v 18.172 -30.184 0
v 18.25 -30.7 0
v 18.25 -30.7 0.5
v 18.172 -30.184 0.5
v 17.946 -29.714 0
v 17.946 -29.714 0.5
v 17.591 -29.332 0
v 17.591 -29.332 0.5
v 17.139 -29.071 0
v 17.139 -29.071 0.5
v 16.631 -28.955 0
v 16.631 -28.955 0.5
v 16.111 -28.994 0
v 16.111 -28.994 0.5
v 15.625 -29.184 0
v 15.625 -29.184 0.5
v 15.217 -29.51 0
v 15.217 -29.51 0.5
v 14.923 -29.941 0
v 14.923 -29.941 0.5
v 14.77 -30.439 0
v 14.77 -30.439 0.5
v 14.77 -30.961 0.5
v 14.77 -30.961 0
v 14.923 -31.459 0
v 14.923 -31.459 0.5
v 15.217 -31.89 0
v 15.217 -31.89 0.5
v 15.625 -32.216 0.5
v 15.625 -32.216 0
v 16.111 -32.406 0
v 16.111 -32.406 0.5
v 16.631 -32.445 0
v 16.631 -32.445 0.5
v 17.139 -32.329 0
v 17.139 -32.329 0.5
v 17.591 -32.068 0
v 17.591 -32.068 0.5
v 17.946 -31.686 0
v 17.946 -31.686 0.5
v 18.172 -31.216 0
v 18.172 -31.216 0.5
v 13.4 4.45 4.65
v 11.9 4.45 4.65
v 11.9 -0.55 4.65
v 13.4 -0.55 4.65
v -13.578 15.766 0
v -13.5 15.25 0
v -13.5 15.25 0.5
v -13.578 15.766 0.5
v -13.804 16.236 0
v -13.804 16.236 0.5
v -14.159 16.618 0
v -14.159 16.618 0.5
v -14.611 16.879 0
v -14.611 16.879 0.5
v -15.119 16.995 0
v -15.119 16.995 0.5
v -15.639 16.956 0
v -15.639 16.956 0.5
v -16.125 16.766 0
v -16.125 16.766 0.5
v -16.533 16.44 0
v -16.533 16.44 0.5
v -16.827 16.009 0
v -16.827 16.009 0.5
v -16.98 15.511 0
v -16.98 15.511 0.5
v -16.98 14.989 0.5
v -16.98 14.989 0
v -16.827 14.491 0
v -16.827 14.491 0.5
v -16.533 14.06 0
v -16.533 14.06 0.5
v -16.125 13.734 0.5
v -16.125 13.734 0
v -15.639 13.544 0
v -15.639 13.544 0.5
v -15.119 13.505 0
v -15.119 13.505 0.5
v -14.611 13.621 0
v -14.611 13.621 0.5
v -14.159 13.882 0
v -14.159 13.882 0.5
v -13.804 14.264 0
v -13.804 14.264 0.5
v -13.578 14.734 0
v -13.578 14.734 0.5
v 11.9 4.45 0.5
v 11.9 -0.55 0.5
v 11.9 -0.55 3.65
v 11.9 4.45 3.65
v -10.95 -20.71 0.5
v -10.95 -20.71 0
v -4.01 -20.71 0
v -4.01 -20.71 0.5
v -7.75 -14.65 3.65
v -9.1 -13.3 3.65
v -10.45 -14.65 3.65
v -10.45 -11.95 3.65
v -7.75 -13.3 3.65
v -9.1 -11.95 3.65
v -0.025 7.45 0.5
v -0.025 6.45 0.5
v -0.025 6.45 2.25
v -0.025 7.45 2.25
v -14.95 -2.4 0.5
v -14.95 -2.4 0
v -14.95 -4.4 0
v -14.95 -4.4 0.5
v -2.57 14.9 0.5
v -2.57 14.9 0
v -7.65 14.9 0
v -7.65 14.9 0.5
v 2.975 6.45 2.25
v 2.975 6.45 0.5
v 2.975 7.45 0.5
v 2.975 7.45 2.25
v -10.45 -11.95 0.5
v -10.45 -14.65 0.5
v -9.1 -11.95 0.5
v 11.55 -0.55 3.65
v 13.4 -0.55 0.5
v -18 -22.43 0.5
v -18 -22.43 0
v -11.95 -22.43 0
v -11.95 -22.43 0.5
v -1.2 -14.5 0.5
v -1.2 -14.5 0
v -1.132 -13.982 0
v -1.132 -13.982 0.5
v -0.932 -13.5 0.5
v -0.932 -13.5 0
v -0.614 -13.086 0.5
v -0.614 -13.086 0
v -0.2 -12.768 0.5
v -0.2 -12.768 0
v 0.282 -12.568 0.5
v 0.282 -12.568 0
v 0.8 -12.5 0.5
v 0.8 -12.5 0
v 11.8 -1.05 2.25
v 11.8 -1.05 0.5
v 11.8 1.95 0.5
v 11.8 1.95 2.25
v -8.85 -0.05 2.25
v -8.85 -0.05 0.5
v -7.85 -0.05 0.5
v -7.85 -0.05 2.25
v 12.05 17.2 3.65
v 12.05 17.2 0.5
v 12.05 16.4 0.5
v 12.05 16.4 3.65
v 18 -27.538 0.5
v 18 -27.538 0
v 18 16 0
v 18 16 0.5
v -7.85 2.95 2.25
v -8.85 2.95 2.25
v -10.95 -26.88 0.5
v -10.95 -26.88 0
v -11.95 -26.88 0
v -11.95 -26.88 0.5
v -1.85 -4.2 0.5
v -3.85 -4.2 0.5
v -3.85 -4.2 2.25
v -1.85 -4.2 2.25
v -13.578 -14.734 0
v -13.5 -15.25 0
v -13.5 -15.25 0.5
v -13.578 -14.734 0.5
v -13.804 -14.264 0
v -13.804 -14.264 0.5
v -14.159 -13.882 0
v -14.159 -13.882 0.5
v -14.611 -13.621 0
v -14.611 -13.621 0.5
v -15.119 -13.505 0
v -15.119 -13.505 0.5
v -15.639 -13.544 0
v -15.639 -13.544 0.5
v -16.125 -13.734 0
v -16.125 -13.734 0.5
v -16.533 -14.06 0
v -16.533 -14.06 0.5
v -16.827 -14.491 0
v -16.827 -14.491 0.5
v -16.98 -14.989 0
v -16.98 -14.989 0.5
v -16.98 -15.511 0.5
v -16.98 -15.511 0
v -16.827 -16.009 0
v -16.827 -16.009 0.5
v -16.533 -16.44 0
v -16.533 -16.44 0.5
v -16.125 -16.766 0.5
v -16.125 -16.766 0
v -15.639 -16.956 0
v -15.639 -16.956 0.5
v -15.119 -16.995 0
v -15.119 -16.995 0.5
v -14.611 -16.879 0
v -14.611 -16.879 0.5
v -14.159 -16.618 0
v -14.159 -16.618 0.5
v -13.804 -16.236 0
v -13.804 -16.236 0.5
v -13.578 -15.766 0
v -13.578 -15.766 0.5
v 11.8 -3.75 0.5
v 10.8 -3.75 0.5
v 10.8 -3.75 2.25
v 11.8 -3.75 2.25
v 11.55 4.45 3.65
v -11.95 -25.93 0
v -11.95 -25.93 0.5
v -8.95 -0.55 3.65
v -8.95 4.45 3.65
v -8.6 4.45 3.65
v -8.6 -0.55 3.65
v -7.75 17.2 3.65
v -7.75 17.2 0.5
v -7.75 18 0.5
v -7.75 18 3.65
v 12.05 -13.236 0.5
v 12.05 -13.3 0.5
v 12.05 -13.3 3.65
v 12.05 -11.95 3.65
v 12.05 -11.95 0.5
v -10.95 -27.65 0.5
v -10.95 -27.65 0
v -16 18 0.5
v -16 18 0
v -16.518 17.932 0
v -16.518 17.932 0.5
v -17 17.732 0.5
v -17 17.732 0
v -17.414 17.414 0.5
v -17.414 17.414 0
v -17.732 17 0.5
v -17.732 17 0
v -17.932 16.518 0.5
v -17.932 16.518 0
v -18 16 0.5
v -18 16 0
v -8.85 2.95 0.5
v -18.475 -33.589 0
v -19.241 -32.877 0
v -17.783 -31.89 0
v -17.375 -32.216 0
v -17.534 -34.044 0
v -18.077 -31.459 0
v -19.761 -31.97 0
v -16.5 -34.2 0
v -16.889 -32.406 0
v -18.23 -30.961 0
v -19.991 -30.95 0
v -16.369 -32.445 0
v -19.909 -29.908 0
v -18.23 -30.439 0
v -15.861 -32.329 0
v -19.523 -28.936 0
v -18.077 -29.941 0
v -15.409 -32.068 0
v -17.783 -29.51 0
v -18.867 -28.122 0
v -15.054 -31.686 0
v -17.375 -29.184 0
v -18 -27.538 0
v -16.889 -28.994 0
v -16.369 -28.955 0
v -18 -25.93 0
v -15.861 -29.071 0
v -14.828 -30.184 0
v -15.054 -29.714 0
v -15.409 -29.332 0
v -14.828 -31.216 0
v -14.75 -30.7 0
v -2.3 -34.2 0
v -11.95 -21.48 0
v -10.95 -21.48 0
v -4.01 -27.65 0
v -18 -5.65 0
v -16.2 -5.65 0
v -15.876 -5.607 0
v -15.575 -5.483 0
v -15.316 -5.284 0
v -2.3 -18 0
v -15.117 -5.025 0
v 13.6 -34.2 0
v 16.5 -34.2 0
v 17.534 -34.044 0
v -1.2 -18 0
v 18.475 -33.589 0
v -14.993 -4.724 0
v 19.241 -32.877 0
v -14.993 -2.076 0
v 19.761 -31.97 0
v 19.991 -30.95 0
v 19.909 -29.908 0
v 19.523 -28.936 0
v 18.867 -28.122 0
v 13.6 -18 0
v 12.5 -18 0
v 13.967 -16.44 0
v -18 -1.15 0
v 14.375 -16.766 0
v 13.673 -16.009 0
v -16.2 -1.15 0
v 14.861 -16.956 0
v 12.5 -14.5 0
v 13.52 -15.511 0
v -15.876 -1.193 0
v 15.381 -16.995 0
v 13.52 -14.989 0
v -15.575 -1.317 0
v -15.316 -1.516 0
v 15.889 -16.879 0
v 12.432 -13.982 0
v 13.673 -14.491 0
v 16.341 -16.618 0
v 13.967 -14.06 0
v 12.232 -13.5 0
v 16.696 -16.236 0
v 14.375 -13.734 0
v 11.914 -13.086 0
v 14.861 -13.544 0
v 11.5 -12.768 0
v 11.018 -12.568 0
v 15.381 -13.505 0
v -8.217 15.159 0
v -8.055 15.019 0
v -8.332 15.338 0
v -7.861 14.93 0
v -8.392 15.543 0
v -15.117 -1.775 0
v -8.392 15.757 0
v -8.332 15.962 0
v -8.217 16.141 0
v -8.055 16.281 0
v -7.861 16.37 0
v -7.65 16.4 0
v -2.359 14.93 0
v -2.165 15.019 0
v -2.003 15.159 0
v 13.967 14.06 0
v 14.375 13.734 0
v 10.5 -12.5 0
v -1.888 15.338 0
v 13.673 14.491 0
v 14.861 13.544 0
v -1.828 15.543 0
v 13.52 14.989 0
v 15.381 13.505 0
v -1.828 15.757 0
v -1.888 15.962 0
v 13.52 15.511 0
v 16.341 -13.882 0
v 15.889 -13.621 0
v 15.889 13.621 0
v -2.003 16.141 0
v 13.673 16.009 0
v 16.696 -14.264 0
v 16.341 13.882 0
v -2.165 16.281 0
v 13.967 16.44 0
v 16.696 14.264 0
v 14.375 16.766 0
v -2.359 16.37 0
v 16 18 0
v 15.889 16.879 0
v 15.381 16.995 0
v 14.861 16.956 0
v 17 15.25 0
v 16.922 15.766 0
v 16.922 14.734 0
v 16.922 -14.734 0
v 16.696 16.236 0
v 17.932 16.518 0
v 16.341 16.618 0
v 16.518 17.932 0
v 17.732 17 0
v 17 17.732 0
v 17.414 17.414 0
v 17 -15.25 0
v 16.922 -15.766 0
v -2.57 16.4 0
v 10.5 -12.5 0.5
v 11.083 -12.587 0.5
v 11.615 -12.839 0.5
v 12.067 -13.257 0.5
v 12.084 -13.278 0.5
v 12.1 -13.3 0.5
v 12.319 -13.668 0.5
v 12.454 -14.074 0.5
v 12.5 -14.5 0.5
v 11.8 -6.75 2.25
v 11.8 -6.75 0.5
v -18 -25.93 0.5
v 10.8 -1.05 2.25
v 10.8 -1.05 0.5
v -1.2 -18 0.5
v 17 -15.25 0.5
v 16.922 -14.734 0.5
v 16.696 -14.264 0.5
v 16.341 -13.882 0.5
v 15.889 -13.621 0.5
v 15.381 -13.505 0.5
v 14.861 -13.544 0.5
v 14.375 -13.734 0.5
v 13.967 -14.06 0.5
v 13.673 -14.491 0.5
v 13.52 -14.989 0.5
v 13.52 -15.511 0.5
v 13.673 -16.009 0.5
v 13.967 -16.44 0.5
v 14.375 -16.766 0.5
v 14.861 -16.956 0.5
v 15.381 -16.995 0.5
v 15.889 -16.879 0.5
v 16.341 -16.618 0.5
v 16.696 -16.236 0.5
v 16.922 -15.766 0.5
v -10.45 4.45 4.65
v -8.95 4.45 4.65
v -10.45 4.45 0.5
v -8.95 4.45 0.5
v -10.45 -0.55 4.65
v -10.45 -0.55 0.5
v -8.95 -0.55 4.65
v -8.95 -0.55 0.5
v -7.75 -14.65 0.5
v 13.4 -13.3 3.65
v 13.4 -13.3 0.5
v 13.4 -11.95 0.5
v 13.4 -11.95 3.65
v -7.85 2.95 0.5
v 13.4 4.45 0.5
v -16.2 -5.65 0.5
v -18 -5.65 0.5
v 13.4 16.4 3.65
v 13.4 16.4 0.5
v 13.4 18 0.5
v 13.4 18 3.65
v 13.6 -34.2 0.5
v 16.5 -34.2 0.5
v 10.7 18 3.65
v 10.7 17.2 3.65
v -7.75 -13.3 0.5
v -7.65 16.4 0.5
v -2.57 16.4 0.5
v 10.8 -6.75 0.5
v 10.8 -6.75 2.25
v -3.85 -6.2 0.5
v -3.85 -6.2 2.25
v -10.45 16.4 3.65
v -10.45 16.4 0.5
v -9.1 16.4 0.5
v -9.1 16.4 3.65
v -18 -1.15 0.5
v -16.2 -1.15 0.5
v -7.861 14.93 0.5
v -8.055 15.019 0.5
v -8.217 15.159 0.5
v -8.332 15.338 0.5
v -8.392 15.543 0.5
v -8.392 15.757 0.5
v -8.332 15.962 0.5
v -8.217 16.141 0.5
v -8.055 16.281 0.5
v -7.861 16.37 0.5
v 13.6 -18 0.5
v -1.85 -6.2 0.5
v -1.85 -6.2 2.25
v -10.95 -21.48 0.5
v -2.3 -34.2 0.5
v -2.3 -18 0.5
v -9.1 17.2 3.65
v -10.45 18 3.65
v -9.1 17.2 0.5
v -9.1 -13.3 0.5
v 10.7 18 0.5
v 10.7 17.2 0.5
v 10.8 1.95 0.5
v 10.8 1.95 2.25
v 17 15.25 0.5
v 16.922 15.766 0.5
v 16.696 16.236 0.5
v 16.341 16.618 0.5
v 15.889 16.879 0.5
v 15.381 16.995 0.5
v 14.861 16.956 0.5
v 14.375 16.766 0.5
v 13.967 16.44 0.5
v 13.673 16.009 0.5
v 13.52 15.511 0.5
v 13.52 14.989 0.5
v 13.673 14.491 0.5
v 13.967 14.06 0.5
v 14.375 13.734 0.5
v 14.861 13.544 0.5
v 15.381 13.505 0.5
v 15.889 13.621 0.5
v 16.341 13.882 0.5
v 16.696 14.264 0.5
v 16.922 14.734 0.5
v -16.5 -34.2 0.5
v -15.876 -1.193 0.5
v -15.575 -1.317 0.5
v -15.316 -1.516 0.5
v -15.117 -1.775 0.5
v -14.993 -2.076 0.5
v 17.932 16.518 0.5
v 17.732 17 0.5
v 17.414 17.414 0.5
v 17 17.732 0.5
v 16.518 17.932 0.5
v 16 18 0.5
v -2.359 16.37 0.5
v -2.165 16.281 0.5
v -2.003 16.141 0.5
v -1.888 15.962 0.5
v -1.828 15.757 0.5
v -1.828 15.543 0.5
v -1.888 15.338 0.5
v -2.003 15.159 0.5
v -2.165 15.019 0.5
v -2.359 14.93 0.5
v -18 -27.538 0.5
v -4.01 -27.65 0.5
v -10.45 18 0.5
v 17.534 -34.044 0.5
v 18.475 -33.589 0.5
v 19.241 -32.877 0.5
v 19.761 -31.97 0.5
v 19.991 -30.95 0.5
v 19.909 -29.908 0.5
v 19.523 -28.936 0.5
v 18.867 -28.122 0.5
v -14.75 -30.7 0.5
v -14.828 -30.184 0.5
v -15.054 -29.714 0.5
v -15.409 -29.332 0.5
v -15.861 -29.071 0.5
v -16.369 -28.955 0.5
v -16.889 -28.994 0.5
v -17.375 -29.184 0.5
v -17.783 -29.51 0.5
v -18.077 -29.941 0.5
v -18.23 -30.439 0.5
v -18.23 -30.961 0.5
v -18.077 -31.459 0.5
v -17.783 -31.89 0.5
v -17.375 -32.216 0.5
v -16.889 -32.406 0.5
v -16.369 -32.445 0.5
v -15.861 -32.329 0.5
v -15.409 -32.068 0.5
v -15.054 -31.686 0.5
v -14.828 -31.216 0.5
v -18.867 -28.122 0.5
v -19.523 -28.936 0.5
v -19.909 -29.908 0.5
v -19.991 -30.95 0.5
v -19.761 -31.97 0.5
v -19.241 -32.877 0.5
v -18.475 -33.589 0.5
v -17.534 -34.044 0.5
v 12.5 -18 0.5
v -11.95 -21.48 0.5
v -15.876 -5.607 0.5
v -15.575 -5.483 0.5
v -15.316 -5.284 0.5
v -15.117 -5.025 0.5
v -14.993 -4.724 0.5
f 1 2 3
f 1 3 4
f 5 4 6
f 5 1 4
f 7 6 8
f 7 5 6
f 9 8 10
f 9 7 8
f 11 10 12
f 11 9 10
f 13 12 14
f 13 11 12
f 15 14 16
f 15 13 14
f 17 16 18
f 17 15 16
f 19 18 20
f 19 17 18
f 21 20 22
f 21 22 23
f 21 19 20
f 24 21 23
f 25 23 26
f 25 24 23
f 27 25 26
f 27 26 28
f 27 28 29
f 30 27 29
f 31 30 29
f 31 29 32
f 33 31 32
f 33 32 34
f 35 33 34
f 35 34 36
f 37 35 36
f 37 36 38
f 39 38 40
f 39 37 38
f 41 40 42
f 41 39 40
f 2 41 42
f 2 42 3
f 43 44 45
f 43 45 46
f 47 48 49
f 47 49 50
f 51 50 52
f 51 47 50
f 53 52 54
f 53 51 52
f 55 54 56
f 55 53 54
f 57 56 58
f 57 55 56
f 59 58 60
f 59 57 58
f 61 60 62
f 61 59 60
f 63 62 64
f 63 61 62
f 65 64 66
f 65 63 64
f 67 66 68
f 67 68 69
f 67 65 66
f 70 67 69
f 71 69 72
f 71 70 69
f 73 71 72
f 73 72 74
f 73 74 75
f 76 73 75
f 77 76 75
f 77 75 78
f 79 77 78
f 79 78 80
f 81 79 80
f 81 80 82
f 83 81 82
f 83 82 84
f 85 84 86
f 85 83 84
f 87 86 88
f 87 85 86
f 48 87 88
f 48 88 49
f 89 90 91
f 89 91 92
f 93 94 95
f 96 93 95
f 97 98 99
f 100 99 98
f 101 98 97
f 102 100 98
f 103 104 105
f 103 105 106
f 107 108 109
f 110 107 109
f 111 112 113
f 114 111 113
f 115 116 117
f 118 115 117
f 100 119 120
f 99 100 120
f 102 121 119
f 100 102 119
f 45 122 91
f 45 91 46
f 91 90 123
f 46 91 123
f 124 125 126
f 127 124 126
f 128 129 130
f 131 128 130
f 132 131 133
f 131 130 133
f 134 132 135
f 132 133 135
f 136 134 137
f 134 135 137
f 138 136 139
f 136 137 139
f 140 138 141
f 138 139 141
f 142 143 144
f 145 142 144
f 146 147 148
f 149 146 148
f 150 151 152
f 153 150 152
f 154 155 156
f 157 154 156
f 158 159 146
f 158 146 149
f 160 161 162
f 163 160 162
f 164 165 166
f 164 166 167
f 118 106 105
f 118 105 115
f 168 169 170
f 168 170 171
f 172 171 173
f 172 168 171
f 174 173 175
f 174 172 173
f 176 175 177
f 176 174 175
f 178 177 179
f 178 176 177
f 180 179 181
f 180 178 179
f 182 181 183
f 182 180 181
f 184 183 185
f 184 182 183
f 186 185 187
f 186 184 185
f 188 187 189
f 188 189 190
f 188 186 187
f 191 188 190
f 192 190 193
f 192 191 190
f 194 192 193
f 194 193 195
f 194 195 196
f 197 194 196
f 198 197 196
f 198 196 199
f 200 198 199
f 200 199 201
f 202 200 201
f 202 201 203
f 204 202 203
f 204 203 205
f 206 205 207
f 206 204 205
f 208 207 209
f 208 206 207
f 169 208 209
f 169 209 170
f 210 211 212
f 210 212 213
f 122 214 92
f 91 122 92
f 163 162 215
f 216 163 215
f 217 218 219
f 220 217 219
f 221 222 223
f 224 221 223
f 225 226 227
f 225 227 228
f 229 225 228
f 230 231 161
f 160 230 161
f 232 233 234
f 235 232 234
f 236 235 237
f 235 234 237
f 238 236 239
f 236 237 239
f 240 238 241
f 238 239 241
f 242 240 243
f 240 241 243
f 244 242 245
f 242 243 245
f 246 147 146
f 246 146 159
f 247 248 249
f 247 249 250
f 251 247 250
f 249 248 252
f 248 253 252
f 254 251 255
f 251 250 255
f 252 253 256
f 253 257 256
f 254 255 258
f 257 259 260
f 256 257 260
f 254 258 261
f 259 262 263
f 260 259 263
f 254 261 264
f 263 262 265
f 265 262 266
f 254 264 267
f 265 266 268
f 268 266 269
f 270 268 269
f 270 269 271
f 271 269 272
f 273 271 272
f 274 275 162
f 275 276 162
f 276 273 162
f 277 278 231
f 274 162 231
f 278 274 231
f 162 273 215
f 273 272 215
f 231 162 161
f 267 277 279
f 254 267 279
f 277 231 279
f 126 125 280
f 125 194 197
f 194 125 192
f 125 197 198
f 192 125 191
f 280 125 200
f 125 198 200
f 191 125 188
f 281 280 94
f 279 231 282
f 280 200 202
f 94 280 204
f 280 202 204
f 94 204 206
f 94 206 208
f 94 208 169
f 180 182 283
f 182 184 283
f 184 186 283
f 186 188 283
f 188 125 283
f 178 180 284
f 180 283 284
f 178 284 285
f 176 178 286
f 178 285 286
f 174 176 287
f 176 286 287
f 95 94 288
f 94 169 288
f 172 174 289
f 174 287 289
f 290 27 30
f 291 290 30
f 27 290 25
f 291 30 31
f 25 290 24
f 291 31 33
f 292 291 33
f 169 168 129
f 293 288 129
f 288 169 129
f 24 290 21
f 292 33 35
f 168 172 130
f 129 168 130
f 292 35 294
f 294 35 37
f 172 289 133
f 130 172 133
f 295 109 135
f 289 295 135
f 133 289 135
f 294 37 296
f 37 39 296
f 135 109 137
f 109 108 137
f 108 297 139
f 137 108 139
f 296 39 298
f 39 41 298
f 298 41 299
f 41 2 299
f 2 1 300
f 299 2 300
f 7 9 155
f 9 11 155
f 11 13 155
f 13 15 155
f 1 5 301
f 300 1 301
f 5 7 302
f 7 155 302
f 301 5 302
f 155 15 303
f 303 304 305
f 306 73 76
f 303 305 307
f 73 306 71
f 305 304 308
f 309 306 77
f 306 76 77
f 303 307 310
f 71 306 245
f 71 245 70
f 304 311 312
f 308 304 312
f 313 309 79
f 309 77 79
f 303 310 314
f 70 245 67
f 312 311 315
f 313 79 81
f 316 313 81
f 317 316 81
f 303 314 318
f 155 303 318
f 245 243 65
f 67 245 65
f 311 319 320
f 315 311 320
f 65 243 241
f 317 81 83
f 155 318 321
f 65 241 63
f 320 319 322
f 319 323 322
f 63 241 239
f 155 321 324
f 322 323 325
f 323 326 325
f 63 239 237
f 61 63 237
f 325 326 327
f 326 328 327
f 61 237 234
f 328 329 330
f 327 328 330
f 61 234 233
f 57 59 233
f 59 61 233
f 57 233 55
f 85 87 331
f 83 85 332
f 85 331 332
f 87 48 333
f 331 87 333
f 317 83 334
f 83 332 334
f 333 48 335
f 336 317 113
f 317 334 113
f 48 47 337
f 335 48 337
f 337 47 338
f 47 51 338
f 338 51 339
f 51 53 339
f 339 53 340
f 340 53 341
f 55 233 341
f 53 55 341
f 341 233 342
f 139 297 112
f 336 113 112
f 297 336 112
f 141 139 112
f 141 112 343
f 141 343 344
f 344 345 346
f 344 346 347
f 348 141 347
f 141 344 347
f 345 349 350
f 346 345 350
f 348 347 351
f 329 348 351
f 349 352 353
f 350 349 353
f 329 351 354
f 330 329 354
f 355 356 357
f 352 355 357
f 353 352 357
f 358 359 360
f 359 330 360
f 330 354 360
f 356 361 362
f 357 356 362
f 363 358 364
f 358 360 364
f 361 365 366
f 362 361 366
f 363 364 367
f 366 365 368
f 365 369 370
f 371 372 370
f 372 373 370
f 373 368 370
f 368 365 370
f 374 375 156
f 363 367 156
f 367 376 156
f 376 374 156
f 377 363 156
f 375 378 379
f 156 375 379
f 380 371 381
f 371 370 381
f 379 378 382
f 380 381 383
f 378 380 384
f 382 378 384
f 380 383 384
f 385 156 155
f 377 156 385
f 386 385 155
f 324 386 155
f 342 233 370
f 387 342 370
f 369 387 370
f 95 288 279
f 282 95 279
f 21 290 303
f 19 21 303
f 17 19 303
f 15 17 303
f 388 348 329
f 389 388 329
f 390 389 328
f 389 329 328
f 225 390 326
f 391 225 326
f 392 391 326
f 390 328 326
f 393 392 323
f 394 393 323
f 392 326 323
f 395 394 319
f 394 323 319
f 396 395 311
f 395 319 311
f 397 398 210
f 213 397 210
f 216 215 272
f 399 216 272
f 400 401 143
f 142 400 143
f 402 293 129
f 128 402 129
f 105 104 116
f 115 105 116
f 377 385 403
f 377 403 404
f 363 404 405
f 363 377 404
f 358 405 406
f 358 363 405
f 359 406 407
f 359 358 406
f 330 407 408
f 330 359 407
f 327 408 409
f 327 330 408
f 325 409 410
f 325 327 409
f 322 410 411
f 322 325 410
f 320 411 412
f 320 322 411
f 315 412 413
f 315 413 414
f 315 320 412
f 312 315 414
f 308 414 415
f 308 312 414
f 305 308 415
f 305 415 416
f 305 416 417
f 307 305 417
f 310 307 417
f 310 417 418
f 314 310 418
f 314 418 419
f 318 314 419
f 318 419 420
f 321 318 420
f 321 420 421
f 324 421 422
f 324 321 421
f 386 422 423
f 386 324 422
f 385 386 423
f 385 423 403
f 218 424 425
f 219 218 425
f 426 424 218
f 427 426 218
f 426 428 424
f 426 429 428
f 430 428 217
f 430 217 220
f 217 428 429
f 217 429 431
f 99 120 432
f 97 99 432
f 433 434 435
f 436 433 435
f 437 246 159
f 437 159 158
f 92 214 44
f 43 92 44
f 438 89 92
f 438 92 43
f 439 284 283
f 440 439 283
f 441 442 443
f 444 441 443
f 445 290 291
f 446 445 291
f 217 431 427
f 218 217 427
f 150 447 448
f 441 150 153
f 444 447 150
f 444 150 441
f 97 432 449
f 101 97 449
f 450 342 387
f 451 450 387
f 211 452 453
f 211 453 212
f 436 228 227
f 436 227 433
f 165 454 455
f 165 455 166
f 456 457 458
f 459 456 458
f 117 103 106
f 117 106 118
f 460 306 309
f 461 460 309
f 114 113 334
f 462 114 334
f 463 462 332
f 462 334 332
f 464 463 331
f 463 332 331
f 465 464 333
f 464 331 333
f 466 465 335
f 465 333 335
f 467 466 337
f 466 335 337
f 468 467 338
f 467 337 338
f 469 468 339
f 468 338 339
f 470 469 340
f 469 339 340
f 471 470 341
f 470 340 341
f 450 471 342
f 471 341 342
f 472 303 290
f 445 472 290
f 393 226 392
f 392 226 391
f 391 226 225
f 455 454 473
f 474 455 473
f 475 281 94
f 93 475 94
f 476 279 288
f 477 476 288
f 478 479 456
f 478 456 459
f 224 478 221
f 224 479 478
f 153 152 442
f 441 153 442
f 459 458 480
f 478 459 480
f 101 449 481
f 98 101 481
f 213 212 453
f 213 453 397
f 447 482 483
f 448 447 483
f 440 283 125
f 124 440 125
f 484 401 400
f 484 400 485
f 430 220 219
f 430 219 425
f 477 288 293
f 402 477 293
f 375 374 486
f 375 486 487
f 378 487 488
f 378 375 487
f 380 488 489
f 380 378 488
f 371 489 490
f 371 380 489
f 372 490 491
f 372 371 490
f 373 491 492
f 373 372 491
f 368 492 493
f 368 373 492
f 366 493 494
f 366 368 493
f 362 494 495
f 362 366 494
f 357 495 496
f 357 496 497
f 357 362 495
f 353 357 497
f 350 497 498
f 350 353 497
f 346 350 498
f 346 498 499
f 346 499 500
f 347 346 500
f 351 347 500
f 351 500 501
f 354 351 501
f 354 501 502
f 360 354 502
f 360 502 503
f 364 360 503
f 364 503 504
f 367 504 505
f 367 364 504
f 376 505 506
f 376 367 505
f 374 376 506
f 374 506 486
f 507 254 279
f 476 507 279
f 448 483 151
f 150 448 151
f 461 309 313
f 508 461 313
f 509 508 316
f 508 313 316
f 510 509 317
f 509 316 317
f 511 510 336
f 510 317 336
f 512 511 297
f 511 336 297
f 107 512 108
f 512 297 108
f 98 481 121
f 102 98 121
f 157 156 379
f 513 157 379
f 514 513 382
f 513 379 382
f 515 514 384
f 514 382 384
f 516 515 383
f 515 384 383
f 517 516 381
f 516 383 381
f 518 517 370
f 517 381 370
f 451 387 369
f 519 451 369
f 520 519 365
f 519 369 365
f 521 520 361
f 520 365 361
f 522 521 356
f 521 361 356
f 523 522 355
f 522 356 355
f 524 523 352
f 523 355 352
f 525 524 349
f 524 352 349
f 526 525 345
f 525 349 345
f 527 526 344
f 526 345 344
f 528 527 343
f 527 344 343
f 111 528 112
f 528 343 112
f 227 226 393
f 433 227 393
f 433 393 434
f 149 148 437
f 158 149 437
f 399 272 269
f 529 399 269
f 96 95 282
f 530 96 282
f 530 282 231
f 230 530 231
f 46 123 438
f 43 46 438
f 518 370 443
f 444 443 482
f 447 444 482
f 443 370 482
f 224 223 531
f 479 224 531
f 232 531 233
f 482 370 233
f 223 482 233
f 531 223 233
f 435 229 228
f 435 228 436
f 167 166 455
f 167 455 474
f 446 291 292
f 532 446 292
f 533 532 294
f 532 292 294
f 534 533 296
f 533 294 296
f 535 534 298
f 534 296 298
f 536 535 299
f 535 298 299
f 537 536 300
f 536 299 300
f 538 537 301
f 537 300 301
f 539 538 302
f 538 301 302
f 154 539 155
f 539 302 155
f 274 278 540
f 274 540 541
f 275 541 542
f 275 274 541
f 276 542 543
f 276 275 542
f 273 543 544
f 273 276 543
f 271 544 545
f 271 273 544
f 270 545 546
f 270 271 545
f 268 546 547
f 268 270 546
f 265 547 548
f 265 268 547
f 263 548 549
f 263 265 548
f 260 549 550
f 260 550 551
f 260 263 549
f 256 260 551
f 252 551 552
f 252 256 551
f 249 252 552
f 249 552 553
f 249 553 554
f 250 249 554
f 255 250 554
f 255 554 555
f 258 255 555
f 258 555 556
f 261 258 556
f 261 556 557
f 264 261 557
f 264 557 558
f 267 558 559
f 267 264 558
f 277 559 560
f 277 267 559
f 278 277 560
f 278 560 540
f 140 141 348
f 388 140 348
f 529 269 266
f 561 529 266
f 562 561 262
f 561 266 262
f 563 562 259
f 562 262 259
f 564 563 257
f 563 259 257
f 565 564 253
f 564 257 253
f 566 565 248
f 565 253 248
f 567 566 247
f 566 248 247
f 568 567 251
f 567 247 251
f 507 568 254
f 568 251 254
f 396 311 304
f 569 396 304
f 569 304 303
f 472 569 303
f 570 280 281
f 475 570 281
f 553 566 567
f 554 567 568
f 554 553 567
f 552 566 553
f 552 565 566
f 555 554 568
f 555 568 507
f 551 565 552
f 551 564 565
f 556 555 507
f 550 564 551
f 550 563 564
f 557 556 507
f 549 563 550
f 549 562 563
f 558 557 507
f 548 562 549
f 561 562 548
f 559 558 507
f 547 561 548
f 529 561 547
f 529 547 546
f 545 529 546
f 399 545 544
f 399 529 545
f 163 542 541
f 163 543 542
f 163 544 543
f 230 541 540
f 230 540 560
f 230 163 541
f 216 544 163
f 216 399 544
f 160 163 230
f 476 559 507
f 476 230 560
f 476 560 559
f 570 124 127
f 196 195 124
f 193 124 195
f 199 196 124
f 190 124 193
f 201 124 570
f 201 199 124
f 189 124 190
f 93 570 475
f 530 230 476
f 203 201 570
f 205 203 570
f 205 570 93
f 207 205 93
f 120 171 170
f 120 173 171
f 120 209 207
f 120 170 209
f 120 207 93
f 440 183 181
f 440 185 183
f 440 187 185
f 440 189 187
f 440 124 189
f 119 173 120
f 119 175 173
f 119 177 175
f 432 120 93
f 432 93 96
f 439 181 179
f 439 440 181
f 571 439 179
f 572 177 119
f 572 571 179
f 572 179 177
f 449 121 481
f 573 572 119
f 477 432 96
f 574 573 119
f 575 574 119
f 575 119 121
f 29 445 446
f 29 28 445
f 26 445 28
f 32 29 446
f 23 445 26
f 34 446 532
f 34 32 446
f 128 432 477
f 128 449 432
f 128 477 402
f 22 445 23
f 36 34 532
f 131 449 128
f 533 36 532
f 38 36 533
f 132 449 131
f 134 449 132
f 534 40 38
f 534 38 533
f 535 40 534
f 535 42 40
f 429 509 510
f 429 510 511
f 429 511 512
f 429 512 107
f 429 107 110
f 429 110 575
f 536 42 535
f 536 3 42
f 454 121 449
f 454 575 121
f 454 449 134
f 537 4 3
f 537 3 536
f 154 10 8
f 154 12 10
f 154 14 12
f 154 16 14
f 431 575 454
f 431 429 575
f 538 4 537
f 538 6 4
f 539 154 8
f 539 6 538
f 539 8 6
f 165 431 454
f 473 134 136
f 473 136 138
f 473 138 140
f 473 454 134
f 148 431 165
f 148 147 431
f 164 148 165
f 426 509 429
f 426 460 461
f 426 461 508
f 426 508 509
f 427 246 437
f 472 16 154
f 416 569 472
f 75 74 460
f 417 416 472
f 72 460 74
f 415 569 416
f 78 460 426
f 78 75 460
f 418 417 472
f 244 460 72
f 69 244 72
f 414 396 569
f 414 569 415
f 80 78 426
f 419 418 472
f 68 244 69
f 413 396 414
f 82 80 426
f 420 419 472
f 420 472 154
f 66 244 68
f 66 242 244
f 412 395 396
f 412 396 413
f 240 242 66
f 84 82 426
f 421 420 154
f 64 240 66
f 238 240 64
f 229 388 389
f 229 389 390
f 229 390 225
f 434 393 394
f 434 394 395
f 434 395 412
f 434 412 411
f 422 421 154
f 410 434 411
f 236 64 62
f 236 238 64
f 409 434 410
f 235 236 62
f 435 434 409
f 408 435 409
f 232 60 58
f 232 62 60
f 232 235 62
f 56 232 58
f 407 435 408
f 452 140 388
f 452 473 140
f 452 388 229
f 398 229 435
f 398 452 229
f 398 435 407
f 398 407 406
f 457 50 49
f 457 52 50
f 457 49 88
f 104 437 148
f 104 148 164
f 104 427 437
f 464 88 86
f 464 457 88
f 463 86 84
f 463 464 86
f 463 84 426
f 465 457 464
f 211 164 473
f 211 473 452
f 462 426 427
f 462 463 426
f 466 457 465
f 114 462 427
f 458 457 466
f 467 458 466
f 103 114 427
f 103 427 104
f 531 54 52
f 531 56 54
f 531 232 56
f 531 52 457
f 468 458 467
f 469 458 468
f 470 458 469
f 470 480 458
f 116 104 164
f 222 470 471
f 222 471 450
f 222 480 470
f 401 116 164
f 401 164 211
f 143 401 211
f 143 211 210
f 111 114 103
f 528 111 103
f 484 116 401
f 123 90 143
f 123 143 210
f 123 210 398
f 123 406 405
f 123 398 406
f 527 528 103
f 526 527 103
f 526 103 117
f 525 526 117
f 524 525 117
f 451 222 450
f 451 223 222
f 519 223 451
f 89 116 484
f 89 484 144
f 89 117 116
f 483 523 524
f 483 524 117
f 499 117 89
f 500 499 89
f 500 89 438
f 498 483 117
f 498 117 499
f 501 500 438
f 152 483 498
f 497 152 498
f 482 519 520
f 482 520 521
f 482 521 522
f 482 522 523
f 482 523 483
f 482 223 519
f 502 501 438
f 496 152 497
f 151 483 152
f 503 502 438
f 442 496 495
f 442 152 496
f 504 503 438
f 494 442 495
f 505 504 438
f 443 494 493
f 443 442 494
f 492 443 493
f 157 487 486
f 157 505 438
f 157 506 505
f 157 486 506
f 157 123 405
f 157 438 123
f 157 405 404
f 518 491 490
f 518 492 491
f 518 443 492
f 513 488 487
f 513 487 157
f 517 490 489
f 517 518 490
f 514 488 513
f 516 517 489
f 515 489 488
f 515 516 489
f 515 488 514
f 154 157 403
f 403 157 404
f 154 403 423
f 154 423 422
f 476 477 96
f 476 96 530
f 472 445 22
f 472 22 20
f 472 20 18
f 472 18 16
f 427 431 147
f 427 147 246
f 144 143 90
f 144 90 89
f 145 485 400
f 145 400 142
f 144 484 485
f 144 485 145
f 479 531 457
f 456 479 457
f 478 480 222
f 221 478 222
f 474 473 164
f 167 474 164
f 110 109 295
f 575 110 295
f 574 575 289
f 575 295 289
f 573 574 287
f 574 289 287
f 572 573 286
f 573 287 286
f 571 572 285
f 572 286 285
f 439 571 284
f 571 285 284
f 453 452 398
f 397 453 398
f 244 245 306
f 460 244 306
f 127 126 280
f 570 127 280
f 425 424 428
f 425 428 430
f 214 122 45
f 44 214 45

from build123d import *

# Parameters (mm, degrees)
SKETCH1_R           = 1.75
BASE_SHAPE_DEPTH    = 0.5
SKETCH2_W           = 3
SKETCH2_H           = 1
SKETCH2_W_2         = 1
SKETCH2_H_2         = 3
SKETCH2_W_3         = 2
SKETCH2_H_3         = 2
RX_SUPPORTS_DEPTH   = 1.75
SKETCH3_W           = 1.5
SKETCH3_H           = 5
CLIP_BASE_DEPTH     = 3.15
SKETCH4_W           = 1.85
SKETCH4_H           = 5
CLIP_TOP_DEPTH      = 1
CLIP_CHAMFER_REACH  = 41.42
SKETCH6_W           = 1.35
SKETCH6_H           = 1.35
BOSS_EXTRUDE1_DEPTH = 3.15


with BuildPart() as part:
    # Sketch1 → Base shape (new body)
    with BuildSketch(Plane.XY):
        with BuildLine():
            Line((18, -27.53772234), (18, 16))
            ThreePointArc((18, 16), (17.414213562, 17.414213562), (16, 18))
            Line((16, 18), (-16, 18))
            ThreePointArc((-16, 18), (-17.414213562, 17.414213562), (-18, 16))
            Line((-18, 16), (-18, -1.15))
            Line((-18, -1.15), (-16.2, -1.15))
            ThreePointArc((-16.2, -1.15), (-15.316116524, -1.516116524), (-14.95, -2.4))
            Line((-14.95, -2.4), (-14.95, -4.4))
            ThreePointArc((-14.95, -4.4), (-15.316116524, -5.283883476), (-16.2, -5.65))
            Line((-16.2, -5.65), (-18, -5.65))
            Line((-18, -5.65), (-18, -22.43))
            Line((-18, -22.43), (-11.95, -22.43))
            Line((-11.95, -22.43), (-11.95, -21.48))
            Line((-11.95, -21.48), (-10.95, -21.48))
            Line((-10.95, -21.48), (-10.95, -20.71))
            Line((-10.95, -20.71), (-4.01, -20.71))
            Line((-4.01, -20.71), (-4.01, -27.65))
            Line((-4.01, -27.65), (-10.95, -27.65))
            Line((-10.95, -27.65), (-10.95, -26.88))
            Line((-10.95, -26.88), (-11.95, -26.88))
            Line((-11.95, -26.88), (-11.95, -25.93))
            Line((-11.95, -25.93), (-18, -25.93))
            Line((-18, -25.93), (-18, -27.53772234))
            ThreePointArc((-18, -27.53772234), (-19.914525722, -31.468774411), (-16.5, -34.2))
            Line((-16.5, -34.2), (-2.3, -34.2))
            Line((-2.3, -34.2), (-2.3, -18))
            Line((-2.3, -18), (-1.2, -18))
            Line((-1.2, -18), (-1.2, -14.5))
            ThreePointArc((-1.2, -14.5), (-0.614213562, -13.085786438), (0.8, -12.5))
            Line((0.8, -12.5), (10.5, -12.5))
            ThreePointArc((10.5, -12.5), (11.914213562, -13.085786438), (12.5, -14.5))
            Line((12.5, -14.5), (12.5, -18))
            Line((12.5, -18), (13.6, -18))
            Line((13.6, -18), (13.6, -34.2))
            Line((13.6, -34.2), (16.5, -34.2))
            ThreePointArc((16.5, -34.2), (19.914525722, -31.468774411), (18, -27.53772234))
        make_face()
        with Locations((16.5, -30.7)):
            Circle(SKETCH1_R, mode=Mode.SUBTRACT)
        with Locations((15.25, 15.25)):
            Circle(SKETCH1_R, mode=Mode.SUBTRACT)
        with Locations((-15.25, -15.25)):
            Circle(SKETCH1_R, mode=Mode.SUBTRACT)
        with Locations((15.25, -15.25)):
            Circle(SKETCH1_R, mode=Mode.SUBTRACT)
        with Locations((-15.25, 15.25)):
            Circle(SKETCH1_R, mode=Mode.SUBTRACT)
        with BuildLine():
            ThreePointArc((-7.65, 14.9), (-8.4, 15.65), (-7.65, 16.4))
            Line((-7.65, 16.4), (-2.57, 16.4))
            ThreePointArc((-2.57, 16.4), (-1.82, 15.65), (-2.57, 14.9))
            Line((-2.57, 14.9), (-7.65, 14.9))
        make_face(mode=Mode.SUBTRACT)
        with Locations((-16.5, -30.7)):
            Circle(SKETCH1_R, mode=Mode.SUBTRACT)
    extrude(amount=BASE_SHAPE_DEPTH)

    # Sketch2 → RX supports (add)
    with BuildSketch(Plane.XY.offset(0.5)):
        with Locations((1.475, 6.95)):
            Rectangle(SKETCH2_W, SKETCH2_H)
        with Locations((-8.35, 1.45)):
            Rectangle(SKETCH2_W_2, SKETCH2_H_2)
        with Locations((-2.85, -5.2)):
            Rectangle(SKETCH2_W_3, SKETCH2_H_3)
        with Locations((11.3, 0.45)):
            Rectangle(SKETCH2_W_2, SKETCH2_H_2)
        with Locations((11.3, -5.25)):
            Rectangle(SKETCH2_W_2, SKETCH2_H_2)
    extrude(amount=RX_SUPPORTS_DEPTH)

    # Sketch3 → Clip base (add)
    with BuildSketch(Plane.XY.offset(0.5)):
        with Locations((-9.7, 1.95)):
            Rectangle(SKETCH3_W, SKETCH3_H)
        with Locations((12.65, 1.95)):
            Rectangle(SKETCH3_W, SKETCH3_H)
    extrude(amount=CLIP_BASE_DEPTH)

    # Sketch4 → Clip top (add)
    with BuildSketch(Plane.XY.offset(3.65)):
        with Locations((-9.525, 1.95)):
            Rectangle(SKETCH4_W, SKETCH4_H)
        with Locations((12.475, 1.95)):
            Rectangle(SKETCH4_W, SKETCH4_H)
    extrude(amount=CLIP_TOP_DEPTH)

    # Sketch5 → Clip chamfer (cut, up to next)
    with BuildSketch(Plane.XZ.offset(0.55), mode=Mode.PRIVATE) as clip_chamfer_sk1:
        Polygon((-8.6, 3.65), (-8.95, 4.65), (-8.6, 4.65), align=None)
    clip_chamfer_tool1 = extrude(clip_chamfer_sk1.sketch, amount=-CLIP_CHAMFER_REACH, mode=Mode.PRIVATE) & part.part
    # Sketch5 → Clip chamfer (cut, up to next)
    with BuildSketch(Plane.XZ.offset(0.55), mode=Mode.PRIVATE) as clip_chamfer_sk2:
        Polygon((11.55, 3.65), (11.9, 4.65), (11.55, 4.65), align=None)
    clip_chamfer_tool2 = extrude(clip_chamfer_sk2.sketch, amount=-CLIP_CHAMFER_REACH, mode=Mode.PRIVATE) & part.part
    add(clip_chamfer_tool1.solids().sort_by_distance((-8.716667, -0.55, 4.316667))[0], mode=Mode.SUBTRACT)
    add(clip_chamfer_tool2.solids().sort_by_distance((11.666667, -0.55, 4.316667))[0], mode=Mode.SUBTRACT)

    # Sketch6 → Boss-Extrude1 (add)
    with BuildSketch(Plane.XY.offset(0.5)):
        Polygon((-9.1, 17.2), (-7.75, 17.2), (-7.75, 18), (-10.45, 18), (-10.45, 16.4), (-9.1, 16.4), align=None)
        Polygon((13.4, 18), (10.7, 18), (10.7, 17.2), (12.05, 17.2), (12.05, 16.4), (13.4, 16.4), align=None)
        with Locations((12.725, -12.625)):
            Rectangle(SKETCH6_W, SKETCH6_H)
        Polygon((-9.1, -13.3), (-9.1, -11.95), (-10.45, -11.95), (-10.45, -14.65), (-7.75, -14.65), (-7.75, -13.3), align=None)
    extrude(amount=BOSS_EXTRUDE1_DEPTH)


solid = part.part
